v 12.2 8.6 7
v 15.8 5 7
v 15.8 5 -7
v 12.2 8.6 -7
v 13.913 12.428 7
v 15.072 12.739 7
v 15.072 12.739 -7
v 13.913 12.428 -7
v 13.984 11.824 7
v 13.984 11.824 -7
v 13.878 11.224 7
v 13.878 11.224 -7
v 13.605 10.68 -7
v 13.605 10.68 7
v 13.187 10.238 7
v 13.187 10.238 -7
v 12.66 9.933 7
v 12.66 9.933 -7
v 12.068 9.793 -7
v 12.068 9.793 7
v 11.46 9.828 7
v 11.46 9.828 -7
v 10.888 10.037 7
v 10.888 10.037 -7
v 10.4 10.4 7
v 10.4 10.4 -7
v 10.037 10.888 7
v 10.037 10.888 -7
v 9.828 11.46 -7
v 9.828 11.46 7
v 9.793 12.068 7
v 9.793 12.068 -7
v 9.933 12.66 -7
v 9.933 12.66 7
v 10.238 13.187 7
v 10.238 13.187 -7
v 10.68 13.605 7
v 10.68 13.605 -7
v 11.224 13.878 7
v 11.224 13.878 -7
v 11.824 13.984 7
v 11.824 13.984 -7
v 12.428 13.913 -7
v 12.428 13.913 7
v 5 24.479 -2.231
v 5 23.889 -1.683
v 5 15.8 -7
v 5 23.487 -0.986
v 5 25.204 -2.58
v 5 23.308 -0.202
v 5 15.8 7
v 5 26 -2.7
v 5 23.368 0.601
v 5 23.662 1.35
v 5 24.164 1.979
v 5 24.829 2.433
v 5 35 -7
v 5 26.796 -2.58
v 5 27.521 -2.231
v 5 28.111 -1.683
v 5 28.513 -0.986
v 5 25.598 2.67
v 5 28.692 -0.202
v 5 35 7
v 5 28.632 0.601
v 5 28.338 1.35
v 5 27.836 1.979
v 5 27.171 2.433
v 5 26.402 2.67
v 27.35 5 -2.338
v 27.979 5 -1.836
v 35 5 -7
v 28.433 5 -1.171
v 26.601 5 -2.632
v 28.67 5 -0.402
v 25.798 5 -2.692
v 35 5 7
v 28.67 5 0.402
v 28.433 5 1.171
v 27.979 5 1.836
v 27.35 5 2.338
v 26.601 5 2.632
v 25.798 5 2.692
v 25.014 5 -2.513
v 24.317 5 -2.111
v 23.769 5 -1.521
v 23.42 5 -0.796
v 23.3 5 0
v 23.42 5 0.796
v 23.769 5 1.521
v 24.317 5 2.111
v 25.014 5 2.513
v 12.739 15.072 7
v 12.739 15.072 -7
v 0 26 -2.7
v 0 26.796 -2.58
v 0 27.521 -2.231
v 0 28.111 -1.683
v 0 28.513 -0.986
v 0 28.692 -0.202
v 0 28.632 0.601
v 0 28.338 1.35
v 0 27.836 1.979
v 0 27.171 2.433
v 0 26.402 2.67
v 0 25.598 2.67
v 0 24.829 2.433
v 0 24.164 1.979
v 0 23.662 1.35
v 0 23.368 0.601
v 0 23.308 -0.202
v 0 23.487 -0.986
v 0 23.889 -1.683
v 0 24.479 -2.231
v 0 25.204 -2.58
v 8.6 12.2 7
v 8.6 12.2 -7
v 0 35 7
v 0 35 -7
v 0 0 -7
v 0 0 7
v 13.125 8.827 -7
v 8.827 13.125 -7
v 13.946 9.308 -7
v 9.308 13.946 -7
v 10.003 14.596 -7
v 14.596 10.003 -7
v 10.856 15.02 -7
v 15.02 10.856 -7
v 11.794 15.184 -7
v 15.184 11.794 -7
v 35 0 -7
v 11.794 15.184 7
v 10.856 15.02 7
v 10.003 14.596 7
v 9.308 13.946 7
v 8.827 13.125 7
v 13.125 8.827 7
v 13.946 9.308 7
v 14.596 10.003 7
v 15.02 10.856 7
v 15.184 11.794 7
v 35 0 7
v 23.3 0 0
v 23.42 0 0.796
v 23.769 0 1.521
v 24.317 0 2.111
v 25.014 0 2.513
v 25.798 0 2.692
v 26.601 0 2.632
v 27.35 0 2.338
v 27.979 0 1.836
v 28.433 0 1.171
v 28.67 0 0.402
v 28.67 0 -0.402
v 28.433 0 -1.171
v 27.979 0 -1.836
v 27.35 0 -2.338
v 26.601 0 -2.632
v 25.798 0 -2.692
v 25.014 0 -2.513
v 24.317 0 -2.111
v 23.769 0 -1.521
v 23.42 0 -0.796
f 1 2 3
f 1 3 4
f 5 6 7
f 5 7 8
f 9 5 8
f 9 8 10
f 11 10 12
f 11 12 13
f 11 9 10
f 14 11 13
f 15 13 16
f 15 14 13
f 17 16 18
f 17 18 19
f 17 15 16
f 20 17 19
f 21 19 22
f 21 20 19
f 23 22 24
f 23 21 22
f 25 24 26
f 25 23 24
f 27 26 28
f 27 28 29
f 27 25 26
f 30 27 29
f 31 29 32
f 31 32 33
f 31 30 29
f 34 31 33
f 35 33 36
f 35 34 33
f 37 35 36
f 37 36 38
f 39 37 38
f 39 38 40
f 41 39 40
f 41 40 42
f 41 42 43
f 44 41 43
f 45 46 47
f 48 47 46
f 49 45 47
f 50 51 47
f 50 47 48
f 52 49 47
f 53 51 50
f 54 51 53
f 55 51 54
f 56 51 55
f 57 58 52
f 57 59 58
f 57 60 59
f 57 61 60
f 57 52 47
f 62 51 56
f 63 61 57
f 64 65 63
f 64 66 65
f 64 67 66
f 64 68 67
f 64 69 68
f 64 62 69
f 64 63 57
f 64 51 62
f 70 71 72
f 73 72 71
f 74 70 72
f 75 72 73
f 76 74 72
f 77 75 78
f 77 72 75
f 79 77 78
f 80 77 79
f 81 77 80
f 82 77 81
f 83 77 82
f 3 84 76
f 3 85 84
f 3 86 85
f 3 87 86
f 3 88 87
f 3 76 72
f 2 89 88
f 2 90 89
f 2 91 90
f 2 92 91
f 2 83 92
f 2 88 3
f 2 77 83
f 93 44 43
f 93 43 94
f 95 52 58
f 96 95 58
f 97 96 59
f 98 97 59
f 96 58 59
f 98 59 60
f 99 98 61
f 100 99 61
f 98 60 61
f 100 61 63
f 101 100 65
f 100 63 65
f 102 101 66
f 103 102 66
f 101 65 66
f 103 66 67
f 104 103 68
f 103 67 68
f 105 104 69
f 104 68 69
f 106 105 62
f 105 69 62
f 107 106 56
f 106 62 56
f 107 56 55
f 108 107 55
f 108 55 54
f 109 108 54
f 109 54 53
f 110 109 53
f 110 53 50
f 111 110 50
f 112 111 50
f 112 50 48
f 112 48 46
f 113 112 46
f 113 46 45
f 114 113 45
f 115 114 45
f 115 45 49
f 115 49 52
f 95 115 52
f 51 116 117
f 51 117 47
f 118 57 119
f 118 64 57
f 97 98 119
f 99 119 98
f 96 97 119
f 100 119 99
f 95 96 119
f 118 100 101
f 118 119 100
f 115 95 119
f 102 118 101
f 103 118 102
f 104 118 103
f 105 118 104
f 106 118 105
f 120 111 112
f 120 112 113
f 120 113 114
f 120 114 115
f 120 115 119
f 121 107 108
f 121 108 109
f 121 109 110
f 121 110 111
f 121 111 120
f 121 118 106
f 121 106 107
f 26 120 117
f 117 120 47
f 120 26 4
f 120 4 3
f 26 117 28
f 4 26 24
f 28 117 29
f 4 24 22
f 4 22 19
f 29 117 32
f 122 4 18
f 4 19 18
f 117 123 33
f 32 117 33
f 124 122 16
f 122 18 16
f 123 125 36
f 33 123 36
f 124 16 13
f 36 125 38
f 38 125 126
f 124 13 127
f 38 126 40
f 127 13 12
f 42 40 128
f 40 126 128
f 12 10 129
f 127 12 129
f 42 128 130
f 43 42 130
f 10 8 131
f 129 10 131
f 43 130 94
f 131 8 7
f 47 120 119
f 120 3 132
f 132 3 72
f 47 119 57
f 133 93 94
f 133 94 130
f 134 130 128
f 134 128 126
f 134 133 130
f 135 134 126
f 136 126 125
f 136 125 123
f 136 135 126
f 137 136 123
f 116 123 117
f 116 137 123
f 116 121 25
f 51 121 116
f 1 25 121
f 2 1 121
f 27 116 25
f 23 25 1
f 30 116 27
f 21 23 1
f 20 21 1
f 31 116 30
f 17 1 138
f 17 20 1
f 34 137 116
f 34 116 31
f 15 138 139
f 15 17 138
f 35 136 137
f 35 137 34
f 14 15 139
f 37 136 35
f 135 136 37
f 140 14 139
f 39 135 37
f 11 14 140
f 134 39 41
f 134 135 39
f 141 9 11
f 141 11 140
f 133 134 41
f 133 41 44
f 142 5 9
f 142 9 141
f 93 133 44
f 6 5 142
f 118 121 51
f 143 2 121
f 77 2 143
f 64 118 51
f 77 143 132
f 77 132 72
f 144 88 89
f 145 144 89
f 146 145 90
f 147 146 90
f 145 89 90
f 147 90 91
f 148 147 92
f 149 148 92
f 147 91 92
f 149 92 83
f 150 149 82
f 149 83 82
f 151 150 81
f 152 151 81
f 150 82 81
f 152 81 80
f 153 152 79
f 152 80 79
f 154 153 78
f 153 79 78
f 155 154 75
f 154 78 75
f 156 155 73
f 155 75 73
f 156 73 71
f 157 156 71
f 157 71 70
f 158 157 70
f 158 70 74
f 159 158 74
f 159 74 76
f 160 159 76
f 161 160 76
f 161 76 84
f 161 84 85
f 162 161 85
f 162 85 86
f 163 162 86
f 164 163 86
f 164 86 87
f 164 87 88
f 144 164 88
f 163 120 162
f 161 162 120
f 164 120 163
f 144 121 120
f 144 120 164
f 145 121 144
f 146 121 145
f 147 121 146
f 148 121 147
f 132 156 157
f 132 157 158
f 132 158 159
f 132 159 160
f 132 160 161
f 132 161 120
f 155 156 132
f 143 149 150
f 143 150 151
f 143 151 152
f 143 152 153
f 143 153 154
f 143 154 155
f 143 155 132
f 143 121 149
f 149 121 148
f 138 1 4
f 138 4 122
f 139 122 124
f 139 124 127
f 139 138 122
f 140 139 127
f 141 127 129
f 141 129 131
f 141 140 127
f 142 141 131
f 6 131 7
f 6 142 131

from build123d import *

# Parameters (mm, degrees)
BOSS_EXTRUDE1_DEPTH = 7
SKETCH3_R           = 2.7
CUT_EXTRUDE1_DEPTH  = 47.626172907
SKETCH4_R           = 2.7
CUT_EXTRUDE2_DEPTH  = 47.626172907


with BuildPart() as part:
    # Sketch1 → Boss-Extrude1 (new, symmetric)
    with BuildSketch(Plane.XY):
        with BuildLine():
            Line((0, 35), (0, 0))
            Line((0, 0), (35, 0))
            Line((35, 0), (35, 5))
            Line((35, 5), (15.8, 5))
            Line((15.8, 5), (12.2, 8.6))
            ThreePointArc((12.2, 8.6), (14.596011157, 10.003433414), (15.072479467, 12.739027089))
            Line((15.072479467, 12.739027089), (13.913368476, 12.428444235))
            ThreePointArc((13.913368476, 12.428444235), (10.4, 10.4), (12.428444235, 13.913368476))
            Line((12.428444235, 13.913368476), (12.739027089, 15.072479467))
            ThreePointArc((12.739027089, 15.072479467), (10.003433414, 14.596011157), (8.6, 12.2))
            Line((8.6, 12.2), (5, 15.8))
            Line((5, 15.8), (5, 35))
            Line((5, 35), (0, 35))
        make_face()
    extrude(amount=BOSS_EXTRUDE1_DEPTH, both=True)

    # Sketch3 → Cut-Extrude1 (cut, through all)
    with BuildSketch(Plane(origin=(0, 5, 0), x_dir=(1, 0, 0), z_dir=(0, 1, 0))):
        with Locations(Location((26, 0, 0), (0, 0, 180))):
            Circle(SKETCH3_R)
    extrude(amount=-CUT_EXTRUDE1_DEPTH, mode=Mode.SUBTRACT)

    # Sketch4 → Cut-Extrude2 (cut, through all)
    with BuildSketch(Plane(origin=(5, 0, 0), x_dir=(0, 0, -1), z_dir=(1, 0, 0))):
        with Locations((0, 26)):
            Circle(SKETCH4_R)
    extrude(amount=-CUT_EXTRUDE2_DEPTH, mode=Mode.SUBTRACT)


solid = part.part
